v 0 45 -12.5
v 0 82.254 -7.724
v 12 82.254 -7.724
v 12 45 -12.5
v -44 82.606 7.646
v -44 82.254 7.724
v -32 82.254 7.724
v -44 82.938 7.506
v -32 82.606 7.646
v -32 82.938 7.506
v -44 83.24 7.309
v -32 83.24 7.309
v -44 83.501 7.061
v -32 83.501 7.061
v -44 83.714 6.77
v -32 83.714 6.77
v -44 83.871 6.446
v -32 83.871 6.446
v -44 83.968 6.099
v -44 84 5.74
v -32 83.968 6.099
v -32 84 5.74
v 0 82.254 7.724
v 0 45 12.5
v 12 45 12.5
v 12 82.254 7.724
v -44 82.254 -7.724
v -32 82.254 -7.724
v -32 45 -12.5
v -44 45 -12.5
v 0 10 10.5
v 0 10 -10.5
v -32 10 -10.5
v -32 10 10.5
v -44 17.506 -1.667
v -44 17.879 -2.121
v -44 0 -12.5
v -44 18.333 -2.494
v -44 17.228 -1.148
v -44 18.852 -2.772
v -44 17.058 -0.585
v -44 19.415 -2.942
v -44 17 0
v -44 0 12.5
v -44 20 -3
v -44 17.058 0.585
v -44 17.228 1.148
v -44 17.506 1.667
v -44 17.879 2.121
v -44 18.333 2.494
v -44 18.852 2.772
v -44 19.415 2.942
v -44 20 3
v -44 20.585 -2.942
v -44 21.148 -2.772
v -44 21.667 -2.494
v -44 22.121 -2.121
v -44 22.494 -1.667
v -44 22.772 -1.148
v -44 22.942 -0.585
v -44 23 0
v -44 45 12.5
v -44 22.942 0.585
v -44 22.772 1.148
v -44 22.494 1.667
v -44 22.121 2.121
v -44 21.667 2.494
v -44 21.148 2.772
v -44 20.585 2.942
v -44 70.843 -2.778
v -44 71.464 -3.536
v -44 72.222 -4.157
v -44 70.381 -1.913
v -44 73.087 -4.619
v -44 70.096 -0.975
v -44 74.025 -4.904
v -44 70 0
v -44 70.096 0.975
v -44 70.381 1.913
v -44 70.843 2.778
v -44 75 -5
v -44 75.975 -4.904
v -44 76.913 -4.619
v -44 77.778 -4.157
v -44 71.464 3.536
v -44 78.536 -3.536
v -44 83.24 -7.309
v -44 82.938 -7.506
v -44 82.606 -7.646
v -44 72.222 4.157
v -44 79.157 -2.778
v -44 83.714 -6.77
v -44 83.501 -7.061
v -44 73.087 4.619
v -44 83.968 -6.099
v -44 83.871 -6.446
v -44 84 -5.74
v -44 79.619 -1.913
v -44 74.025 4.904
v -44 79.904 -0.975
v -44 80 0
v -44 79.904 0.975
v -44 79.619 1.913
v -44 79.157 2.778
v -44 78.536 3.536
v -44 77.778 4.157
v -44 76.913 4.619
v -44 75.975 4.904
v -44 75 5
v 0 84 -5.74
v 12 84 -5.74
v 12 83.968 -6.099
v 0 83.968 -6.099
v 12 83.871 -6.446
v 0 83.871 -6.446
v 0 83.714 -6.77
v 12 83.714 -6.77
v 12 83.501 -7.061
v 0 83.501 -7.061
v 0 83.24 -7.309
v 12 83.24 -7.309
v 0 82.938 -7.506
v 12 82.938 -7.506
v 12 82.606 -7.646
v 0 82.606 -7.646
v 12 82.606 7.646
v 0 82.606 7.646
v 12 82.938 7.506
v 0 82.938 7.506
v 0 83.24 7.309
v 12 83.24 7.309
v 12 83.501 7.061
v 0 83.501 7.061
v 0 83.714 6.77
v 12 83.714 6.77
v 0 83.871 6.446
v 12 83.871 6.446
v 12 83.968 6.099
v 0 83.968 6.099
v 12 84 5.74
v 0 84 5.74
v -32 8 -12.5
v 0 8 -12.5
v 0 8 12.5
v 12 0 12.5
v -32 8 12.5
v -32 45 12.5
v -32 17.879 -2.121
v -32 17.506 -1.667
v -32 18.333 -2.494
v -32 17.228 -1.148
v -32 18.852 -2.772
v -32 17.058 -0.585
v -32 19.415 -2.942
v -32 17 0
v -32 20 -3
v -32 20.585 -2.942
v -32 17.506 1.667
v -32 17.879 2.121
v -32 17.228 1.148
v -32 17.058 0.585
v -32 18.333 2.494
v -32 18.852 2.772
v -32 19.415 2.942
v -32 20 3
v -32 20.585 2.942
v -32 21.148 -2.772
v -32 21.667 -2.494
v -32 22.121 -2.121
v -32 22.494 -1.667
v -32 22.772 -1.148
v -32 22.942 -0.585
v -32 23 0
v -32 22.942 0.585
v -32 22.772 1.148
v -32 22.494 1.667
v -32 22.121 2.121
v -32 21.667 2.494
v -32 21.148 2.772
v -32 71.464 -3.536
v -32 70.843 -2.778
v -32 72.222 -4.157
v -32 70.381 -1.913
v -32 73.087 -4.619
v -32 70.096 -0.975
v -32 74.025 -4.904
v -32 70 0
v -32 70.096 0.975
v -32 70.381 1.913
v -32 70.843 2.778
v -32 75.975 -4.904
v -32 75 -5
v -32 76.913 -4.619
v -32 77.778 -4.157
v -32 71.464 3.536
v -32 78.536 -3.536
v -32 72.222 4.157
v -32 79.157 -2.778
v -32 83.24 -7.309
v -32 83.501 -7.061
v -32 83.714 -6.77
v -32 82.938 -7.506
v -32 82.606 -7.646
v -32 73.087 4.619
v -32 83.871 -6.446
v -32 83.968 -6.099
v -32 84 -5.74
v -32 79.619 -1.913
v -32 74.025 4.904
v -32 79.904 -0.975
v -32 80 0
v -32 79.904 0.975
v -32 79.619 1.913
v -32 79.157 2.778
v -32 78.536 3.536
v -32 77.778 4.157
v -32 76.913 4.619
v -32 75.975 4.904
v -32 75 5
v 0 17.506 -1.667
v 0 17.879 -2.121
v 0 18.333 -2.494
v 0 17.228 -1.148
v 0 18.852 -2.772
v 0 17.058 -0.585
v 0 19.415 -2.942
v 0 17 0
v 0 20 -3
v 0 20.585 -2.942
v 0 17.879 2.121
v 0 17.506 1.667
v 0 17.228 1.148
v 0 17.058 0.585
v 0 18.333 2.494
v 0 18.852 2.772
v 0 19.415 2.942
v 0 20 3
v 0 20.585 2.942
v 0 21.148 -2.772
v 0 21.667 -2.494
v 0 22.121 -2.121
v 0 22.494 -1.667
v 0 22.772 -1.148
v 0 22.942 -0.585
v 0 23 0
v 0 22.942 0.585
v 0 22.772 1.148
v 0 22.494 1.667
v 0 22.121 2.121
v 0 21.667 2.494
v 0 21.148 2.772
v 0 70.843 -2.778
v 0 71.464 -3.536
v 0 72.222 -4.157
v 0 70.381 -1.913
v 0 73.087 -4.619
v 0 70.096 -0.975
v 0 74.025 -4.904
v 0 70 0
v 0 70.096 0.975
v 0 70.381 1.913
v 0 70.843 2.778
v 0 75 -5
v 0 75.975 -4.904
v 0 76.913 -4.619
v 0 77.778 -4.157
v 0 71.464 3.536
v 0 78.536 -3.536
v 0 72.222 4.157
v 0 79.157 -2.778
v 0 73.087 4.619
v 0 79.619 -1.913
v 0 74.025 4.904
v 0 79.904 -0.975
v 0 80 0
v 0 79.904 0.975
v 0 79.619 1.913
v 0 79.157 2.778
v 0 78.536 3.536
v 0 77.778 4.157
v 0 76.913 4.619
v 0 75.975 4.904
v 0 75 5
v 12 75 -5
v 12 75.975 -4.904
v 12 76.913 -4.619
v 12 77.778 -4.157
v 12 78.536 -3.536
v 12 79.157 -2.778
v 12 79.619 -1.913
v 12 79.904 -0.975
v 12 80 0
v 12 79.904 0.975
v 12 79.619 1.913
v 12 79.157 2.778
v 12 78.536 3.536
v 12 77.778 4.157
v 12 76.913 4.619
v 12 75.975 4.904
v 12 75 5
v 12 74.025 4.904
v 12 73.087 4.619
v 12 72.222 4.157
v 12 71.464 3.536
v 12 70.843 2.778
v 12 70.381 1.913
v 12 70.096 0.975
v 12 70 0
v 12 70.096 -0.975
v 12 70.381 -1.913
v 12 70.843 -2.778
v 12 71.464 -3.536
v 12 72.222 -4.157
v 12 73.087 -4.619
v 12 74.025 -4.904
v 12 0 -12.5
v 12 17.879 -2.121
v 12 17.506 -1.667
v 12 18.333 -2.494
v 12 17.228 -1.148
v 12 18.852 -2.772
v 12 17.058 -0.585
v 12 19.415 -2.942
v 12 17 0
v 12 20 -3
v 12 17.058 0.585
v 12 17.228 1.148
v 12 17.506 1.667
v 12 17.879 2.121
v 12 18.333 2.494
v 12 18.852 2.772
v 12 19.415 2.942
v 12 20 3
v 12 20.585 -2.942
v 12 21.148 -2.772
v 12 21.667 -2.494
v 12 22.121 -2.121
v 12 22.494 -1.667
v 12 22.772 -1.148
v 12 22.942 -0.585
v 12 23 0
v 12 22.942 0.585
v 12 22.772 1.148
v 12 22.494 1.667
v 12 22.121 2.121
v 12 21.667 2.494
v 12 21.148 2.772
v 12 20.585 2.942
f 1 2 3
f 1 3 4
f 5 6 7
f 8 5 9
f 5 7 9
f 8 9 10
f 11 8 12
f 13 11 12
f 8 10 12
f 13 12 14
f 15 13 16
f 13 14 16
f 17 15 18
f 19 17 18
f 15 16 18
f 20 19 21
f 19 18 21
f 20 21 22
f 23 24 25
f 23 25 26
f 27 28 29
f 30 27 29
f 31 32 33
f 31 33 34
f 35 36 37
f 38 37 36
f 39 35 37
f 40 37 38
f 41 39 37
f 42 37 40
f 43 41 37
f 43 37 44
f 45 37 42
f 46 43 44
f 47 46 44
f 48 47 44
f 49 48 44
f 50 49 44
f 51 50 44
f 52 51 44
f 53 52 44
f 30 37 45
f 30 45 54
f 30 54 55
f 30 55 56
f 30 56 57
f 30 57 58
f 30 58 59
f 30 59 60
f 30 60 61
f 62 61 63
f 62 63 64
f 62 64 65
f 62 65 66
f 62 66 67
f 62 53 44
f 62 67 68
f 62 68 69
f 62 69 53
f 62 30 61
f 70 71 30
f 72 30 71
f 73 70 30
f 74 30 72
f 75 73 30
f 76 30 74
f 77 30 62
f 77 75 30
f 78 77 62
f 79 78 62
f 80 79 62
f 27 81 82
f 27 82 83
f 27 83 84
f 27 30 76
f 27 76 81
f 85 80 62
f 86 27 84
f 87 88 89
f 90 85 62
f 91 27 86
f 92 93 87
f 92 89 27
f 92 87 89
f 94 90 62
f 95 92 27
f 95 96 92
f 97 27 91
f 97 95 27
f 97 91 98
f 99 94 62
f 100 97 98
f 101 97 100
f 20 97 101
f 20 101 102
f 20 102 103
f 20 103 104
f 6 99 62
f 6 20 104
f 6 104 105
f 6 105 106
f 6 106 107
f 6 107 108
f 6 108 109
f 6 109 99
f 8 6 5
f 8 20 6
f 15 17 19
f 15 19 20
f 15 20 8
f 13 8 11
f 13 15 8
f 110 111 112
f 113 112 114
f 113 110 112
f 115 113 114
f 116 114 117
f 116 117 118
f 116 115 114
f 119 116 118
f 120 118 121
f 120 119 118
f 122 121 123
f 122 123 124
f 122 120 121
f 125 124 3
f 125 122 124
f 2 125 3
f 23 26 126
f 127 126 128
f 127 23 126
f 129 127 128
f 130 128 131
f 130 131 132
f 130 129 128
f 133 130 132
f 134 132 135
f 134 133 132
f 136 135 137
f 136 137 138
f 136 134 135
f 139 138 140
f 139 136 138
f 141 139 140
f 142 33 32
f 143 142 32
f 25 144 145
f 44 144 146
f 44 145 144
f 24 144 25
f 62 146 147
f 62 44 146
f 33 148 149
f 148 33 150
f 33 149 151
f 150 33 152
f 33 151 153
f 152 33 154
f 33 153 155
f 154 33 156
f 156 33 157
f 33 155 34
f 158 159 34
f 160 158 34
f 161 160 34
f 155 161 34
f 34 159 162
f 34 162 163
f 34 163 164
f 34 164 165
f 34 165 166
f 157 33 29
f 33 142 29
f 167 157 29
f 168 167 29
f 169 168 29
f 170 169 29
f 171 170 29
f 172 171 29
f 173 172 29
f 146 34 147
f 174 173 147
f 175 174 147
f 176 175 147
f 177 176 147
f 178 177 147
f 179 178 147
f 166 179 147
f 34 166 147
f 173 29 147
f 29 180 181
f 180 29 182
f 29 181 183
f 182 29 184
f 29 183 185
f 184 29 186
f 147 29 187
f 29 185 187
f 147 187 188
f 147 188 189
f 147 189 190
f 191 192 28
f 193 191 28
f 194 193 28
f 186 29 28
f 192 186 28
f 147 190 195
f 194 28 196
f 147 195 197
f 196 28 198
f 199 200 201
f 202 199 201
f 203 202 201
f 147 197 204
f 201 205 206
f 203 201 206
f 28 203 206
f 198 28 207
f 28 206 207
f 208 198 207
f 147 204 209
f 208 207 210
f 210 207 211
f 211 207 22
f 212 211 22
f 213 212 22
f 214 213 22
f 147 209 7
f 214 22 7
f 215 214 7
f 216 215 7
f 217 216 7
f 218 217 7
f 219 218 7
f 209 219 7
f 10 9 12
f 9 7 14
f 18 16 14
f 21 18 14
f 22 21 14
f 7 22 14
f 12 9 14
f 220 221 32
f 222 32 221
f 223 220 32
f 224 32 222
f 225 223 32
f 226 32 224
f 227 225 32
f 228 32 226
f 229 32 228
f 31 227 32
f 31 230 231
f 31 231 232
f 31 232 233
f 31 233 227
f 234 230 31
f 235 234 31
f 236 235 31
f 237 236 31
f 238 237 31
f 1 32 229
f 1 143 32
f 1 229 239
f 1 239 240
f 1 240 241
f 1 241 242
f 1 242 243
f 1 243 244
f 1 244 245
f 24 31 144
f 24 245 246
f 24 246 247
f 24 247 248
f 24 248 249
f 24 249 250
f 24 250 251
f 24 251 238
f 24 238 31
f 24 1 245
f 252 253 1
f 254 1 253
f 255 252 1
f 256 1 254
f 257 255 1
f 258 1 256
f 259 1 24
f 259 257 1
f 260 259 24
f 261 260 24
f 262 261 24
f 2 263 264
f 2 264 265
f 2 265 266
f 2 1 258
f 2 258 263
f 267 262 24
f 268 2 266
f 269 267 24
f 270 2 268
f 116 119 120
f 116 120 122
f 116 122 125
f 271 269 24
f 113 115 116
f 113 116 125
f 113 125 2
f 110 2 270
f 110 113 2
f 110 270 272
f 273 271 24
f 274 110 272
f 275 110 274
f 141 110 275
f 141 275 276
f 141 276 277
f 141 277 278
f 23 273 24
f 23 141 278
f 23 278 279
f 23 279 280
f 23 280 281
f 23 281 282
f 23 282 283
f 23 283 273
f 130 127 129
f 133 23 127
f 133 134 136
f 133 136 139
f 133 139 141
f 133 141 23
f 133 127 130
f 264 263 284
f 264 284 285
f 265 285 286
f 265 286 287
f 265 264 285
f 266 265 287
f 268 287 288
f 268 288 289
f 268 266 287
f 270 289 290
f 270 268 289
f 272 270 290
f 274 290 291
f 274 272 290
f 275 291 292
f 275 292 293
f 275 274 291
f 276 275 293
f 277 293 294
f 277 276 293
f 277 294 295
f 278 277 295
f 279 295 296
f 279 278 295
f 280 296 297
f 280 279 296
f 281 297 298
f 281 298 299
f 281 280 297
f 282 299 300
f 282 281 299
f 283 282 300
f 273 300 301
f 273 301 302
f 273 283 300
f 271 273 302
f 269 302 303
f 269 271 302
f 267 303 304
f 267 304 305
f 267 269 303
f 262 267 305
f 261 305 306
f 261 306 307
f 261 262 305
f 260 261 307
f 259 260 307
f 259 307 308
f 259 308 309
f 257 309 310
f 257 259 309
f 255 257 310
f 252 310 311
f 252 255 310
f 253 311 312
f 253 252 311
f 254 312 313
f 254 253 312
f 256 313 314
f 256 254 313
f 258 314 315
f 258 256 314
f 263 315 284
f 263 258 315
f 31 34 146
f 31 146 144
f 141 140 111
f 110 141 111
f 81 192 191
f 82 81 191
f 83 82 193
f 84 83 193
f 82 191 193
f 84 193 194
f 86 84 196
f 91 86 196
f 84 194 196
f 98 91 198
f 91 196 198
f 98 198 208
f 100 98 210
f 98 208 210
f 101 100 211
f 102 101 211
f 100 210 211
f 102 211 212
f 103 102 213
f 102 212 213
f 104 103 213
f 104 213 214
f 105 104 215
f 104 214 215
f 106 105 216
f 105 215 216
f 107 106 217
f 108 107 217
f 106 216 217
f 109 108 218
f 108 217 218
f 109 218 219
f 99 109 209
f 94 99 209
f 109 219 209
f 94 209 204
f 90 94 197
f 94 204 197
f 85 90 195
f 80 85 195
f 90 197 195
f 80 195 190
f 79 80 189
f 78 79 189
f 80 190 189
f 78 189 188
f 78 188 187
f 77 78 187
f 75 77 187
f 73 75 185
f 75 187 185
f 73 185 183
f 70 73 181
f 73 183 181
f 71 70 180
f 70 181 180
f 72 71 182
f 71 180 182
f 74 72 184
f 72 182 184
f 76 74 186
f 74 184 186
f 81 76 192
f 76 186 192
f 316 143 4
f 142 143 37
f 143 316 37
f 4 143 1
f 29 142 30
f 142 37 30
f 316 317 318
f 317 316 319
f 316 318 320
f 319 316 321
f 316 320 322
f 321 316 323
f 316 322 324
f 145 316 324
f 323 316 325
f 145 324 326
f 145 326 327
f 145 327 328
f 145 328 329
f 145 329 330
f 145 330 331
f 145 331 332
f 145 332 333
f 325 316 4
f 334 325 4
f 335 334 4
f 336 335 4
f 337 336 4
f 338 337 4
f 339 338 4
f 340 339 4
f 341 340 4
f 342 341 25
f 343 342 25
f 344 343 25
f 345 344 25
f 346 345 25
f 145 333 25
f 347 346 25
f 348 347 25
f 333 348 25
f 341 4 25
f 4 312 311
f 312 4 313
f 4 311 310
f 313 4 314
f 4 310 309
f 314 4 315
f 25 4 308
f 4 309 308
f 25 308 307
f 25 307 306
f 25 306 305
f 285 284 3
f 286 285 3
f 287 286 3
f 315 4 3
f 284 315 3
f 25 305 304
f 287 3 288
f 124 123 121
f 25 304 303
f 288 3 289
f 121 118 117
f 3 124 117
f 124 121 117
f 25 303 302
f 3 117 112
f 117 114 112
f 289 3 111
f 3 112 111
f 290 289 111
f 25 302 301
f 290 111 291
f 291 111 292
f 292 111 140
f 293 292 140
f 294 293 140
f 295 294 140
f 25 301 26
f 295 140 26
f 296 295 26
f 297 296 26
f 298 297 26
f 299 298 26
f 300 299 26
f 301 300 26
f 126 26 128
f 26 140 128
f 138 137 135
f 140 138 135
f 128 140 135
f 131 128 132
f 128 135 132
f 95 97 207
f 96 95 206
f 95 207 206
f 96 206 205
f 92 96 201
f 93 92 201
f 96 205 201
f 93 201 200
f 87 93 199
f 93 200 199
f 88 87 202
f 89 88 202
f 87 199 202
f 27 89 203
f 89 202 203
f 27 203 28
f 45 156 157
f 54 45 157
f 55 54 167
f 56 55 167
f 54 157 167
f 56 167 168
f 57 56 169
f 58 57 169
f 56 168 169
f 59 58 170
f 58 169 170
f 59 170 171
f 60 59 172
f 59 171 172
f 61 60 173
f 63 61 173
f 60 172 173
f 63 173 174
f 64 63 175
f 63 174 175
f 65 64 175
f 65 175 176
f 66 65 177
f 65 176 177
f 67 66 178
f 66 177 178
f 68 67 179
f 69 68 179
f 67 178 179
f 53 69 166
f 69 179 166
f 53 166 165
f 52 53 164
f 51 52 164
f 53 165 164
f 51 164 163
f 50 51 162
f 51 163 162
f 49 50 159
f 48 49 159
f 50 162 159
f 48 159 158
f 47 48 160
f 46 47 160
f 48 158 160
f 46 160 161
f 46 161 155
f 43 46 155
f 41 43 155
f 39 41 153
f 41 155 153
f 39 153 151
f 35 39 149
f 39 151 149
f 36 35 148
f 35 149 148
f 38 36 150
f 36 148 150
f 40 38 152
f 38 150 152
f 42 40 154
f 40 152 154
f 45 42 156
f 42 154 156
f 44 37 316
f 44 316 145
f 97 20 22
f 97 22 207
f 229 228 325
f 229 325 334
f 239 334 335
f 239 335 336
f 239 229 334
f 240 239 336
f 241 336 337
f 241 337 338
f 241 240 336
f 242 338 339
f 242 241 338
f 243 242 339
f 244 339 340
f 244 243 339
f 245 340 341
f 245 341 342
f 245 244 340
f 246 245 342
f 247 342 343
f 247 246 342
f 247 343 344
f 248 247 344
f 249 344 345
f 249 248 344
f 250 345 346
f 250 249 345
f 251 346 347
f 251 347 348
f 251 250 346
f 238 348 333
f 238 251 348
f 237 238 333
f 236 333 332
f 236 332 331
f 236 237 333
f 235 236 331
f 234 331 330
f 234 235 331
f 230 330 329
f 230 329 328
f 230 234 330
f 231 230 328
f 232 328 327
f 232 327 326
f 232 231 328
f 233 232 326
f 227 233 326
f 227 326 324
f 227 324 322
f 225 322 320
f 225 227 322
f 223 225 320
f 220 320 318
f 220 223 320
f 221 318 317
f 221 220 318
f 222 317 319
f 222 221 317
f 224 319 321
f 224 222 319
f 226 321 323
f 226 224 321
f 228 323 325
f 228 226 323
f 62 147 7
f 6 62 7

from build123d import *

# Parameters (mm, degrees)
SKETCH1_R           = 3
SKETCH1_R_2         = 5
BOSS_EXTRUDE1_DEPTH = 12
SKETCH3_W           = 25
SKETCH3_H           = 10
BOSS_EXTRUDE2_DEPTH = 16
CHAMFER1_SIZE       = 2


with BuildPart() as part:
    # Sketch1 → Boss-Extrude1 (new body)
    with BuildSketch(Plane(origin=(0, 0, 0), x_dir=(0, 0, -1), z_dir=(1, 0, 0))):
        with BuildLine():
            Line((-12.5, 45), (-7.723804022, 82.254328632))
            ThreePointArc((-7.723804022, 82.254328632), (-7.061279266, 83.501442184), (-5.740040692, 84))
            Line((-5.740040692, 84), (5.740040692, 84))
            ThreePointArc((5.740040692, 84), (7.061279266, 83.501442184), (7.723804022, 82.254328632))
            Line((7.723804022, 82.254328632), (12.5, 45))
            Line((12.5, 45), (12.5, 0))
            Line((12.5, 0), (-12.5, 0))
            Line((-12.5, 0), (-12.5, 45))
        make_face()
        with Locations((0, 20)):
            Circle(SKETCH1_R, mode=Mode.SUBTRACT)
        with Locations((0, 75)):
            Circle(SKETCH1_R_2, mode=Mode.SUBTRACT)
    extrude(amount=BOSS_EXTRUDE1_DEPTH)

    # Sketch3 → Boss-Extrude2 (add)
    with BuildSketch(Plane.ZY):
        with Locations((0, 5)):
            Rectangle(SKETCH3_W, SKETCH3_H)
    extrude(amount=BOSS_EXTRUDE2_DEPTH)

    # Mirror2: part across plane


with BuildPart() as part_1:
    add(part.part)
    add(part.part.mirror(Plane(origin=(-16, 0, 0), x_dir=(0, 0, 1), z_dir=(1, 0, 0))))

    # Chamfer1
    chamfer1_edges = [part_1.edges().sort_by_distance(p)[0] for p in [
        (-16, 10, -12.5),
        (-16, 10, 12.5),
    ]]
    chamfer(chamfer1_edges, length=CHAMFER1_SIZE)


solid = part_1.part
